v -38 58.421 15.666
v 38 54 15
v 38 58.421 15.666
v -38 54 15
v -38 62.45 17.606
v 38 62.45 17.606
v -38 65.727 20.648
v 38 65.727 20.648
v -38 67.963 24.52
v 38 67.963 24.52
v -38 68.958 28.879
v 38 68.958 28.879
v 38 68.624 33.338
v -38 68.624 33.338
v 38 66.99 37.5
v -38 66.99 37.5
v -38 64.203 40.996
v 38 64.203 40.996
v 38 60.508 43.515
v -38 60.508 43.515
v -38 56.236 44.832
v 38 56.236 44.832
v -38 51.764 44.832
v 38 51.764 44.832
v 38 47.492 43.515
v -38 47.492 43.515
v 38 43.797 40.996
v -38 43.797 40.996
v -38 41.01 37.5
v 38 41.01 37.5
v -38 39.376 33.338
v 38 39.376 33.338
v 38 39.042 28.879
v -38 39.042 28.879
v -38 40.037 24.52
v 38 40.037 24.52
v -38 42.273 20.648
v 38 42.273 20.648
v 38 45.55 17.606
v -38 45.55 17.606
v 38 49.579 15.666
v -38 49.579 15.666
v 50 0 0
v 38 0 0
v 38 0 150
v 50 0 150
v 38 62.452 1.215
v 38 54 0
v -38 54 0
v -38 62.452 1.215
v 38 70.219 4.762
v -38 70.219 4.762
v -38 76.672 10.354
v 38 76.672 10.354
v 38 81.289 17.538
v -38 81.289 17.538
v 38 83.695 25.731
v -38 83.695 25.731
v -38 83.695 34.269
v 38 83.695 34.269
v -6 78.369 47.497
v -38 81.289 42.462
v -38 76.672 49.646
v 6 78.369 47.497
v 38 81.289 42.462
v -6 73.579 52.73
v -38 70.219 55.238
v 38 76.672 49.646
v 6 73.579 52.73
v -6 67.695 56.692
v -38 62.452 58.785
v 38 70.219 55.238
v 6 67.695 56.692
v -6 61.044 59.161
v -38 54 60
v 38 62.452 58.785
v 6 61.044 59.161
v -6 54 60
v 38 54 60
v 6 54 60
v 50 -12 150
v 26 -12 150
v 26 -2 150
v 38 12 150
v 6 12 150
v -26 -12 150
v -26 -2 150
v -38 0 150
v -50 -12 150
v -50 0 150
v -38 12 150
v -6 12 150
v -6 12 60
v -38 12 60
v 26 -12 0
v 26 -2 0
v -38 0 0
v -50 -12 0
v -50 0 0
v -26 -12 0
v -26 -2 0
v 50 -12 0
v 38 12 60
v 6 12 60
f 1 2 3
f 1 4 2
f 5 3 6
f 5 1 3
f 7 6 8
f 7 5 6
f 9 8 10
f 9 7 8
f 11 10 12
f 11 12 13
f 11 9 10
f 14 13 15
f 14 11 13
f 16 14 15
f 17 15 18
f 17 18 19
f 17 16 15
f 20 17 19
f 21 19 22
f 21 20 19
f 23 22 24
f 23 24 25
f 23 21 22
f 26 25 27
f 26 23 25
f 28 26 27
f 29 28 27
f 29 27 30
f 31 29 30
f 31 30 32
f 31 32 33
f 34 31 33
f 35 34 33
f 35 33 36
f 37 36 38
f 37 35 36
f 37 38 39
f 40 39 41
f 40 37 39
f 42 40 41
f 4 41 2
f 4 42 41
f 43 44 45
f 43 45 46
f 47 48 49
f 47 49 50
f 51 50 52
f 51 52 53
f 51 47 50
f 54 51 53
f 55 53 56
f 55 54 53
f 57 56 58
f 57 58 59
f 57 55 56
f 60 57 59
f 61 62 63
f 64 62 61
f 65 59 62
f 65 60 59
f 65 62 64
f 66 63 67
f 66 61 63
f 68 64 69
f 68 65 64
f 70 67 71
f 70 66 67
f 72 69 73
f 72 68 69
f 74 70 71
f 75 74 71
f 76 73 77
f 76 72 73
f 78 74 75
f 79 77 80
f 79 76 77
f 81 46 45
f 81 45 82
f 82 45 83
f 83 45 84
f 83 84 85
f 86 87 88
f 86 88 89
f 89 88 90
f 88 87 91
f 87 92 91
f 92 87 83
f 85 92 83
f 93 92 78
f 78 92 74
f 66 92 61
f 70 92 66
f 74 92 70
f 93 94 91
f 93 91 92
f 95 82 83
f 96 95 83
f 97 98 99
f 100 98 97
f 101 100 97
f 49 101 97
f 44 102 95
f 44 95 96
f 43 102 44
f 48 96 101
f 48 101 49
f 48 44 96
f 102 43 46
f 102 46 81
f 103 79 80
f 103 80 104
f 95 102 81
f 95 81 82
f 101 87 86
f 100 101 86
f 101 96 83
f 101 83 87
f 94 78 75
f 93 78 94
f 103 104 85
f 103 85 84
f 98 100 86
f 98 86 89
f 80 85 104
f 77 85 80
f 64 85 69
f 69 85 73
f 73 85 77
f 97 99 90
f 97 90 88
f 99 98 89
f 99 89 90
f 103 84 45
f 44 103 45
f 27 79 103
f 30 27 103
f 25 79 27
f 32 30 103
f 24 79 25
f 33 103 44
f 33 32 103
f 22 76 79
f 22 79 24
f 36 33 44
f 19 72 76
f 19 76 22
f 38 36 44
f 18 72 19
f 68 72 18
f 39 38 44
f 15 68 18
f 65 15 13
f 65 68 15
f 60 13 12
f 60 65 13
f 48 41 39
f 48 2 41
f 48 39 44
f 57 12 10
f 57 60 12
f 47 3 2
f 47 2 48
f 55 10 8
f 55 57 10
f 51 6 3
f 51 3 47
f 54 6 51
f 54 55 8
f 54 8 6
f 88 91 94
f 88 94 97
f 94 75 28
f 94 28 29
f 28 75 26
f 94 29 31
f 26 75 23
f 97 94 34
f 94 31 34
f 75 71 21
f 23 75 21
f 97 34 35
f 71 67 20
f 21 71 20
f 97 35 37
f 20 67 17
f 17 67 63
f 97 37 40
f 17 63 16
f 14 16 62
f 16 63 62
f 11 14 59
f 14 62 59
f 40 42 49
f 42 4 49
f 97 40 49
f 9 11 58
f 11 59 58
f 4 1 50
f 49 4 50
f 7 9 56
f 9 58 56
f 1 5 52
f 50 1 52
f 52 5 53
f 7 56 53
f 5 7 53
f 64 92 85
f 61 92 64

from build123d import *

# Parameters (mm, degrees)
BOSS_EXTRUDE1_DEPTH = 150
SKETCH4_R           = 15
BOSS_EXTRUDE2_DEPTH = 38
RIB1_REACH          = 181.042
SKETCH5_WALL_W      = 482.19756146
SKETCH5_WALL_H      = 12


with BuildPart() as part:
    # Sketch1 → Boss-Extrude1 (new body)
    with BuildSketch(Plane.XY):
        Polygon((-50, 0), (-38, 0), (-38, 12), (38, 12), (38, 0), (50, 0), (50, -12), (26, -12), (26, -2), (-26, -2), (-26, -12), (-50, -12), align=None)
    extrude(amount=BOSS_EXTRUDE1_DEPTH)

    # Sketch4 → Boss-Extrude2 (add, symmetric)
    with BuildSketch(Plane(origin=(0, 0, 0), x_dir=(0, 0, -1), z_dir=(1, 0, 0))):
        with BuildLine():
            Line((0, 12), (0, 54))
            ThreePointArc((0, 54), (-30, 84), (-60, 54))
            Line((-60, 54), (-60, 12))
            Line((-60, 12), (0, 12))
        make_face()
        with Locations((-30, 54)):
            Circle(SKETCH4_R, mode=Mode.SUBTRACT)
    extrude(amount=BOSS_EXTRUDE2_DEPTH, both=True)

    # Sketch5 wall → Rib1 (add, up to next)
    with BuildSketch(Plane(origin=(0, 45.18462462, 98.748424022), x_dir=(0, 0.54350338987, -0.839406972332), z_dir=(0, 0.839406972332, 0.54350338987)), mode=Mode.PRIVATE) as rib1_sk1:
        Rectangle(SKETCH5_WALL_W, SKETCH5_WALL_H)
    rib1_tool1 = extrude(rib1_sk1.sketch, amount=-RIB1_REACH, mode=Mode.PRIVATE) - part.part
    add(rib1_tool1.solids().sort_by_distance((0, 45.18462462, 98.748424022))[0])


solid = part.part
